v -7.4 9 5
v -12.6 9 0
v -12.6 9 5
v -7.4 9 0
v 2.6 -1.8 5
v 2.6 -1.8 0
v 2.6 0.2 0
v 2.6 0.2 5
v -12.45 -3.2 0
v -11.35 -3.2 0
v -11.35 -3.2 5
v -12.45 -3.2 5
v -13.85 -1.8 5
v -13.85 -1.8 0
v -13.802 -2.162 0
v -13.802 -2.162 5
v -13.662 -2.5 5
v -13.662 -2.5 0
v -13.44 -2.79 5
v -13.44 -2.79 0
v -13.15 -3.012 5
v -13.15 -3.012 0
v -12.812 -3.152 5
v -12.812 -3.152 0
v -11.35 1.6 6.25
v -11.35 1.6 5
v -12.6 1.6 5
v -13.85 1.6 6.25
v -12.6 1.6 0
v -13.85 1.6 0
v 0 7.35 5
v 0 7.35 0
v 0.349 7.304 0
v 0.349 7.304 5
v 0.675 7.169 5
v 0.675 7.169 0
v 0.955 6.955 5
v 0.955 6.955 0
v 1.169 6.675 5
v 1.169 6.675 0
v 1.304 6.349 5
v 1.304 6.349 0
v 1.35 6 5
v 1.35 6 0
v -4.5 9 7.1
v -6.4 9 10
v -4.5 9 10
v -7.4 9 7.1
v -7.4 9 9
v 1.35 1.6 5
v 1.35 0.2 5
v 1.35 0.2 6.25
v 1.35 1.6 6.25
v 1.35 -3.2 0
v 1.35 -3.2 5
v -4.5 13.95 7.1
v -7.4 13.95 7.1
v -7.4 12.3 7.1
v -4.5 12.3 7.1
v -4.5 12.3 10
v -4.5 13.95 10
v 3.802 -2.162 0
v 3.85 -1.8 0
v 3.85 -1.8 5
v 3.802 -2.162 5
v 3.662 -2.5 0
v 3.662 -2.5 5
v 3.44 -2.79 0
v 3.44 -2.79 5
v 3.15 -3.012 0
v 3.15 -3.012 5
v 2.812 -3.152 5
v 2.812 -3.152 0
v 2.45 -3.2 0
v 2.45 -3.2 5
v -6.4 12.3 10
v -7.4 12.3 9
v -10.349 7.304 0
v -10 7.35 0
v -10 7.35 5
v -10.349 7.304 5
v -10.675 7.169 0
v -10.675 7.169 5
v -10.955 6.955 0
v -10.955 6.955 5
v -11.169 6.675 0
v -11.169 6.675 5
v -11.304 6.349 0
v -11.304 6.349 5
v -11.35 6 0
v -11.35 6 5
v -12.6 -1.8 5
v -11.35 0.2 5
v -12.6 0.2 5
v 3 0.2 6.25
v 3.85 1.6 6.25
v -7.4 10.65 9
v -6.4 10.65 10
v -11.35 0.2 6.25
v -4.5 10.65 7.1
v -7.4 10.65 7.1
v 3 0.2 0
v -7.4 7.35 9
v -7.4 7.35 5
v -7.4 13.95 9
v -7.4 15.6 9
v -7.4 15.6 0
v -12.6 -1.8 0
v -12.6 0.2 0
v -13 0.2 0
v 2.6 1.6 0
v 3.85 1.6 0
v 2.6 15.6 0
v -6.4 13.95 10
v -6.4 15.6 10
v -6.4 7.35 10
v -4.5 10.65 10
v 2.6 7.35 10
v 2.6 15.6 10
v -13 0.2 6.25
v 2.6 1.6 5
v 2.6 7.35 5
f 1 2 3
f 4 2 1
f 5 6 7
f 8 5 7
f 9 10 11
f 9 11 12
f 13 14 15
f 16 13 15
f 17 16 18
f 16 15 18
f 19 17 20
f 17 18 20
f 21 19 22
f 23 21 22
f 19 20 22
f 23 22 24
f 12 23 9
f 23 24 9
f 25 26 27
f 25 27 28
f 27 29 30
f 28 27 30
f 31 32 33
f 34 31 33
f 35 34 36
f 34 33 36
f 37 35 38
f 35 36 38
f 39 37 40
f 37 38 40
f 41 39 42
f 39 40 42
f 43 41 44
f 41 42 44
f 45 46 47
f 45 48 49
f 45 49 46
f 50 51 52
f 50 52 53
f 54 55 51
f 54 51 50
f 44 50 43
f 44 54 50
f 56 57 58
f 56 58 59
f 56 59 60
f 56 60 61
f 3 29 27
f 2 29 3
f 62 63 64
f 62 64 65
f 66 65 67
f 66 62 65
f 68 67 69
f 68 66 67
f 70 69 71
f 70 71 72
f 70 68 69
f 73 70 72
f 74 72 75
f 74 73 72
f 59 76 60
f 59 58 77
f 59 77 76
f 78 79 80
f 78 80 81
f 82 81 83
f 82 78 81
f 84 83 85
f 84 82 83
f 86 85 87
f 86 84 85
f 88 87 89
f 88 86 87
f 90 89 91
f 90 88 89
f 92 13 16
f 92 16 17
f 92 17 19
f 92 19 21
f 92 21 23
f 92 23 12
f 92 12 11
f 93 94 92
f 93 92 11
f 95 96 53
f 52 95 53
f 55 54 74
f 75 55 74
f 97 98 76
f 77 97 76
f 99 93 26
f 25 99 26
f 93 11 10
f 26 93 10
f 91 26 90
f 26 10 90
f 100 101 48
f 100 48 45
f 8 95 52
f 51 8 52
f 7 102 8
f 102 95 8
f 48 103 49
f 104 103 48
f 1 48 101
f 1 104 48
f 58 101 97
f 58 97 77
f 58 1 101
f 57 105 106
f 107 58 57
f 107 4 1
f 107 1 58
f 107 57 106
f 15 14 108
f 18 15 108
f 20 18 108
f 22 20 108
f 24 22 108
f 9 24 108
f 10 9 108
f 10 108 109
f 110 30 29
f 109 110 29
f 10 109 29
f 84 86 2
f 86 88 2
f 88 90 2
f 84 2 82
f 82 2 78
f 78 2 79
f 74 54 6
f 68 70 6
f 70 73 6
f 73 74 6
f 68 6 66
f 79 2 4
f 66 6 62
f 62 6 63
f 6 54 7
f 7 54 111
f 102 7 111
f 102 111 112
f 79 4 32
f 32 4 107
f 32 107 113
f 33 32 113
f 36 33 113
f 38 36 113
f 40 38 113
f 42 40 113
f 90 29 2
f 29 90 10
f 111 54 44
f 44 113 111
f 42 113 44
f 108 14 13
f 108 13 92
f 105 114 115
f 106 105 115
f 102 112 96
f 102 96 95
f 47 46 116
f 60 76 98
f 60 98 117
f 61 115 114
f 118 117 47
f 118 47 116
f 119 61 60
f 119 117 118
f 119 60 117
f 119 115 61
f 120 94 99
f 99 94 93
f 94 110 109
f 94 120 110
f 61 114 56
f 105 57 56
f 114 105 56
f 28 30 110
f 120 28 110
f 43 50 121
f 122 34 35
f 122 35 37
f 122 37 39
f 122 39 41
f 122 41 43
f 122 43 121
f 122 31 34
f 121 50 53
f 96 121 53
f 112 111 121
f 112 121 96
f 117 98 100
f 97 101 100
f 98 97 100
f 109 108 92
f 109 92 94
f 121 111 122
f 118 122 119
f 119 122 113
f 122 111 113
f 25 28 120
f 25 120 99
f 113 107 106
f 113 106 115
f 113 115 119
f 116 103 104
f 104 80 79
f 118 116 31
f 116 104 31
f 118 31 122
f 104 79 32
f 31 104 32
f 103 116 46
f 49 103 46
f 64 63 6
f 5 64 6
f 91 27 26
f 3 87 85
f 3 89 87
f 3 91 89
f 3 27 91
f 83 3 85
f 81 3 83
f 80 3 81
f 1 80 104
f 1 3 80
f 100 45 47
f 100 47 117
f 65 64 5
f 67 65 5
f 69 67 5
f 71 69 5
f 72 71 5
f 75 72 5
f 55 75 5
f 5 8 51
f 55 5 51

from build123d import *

# Parameters (mm, degrees)
PAD017_DEPTH           = 5
PAD020_DEPTH           = 6.25
SKETCH038_W            = 10
SKETCH038_H            = 1.65
PAD021_DEPTH           = 5
SKETCH089_W            = 10
SKETCH089_H            = 1.65
PAD058_DEPTH           = 10
SKETCH086_W            = 10
SKETCH086_H            = 1.65
PAD059_DEPTH           = 7.1
SKETCH087_W            = 7.1
SKETCH087_H            = 1.65
PAD060_DEPTH           = 10
SKETCH088_W            = 10
SKETCH088_H            = 1.65
PAD061_DEPTH           = 10
LINEARPATTERN020_COUNT = 2
LINEARPATTERN020_PITCH = 3.3
CHAMFER010_SIZE        = 1


with BuildPart() as bc_c:
    # Sketch034 → Pad017 (new body)
    with BuildSketch(Plane.XY):
        with BuildLine():
            Line((-1.35, -1.8), (-1.35, 6))
            ThreePointArc((0, 7.35), (-0.954594, 6.954594), (-1.35, 6))
            Line((0, 9), (0, 7.35))
            Line((-2.6, 9), (0, 9))
            Line((-2.6, -1.8), (-2.6, 9))
            Line((-3.85, -1.8), (-2.6, -1.8))
            ThreePointArc((-3.85, -1.8), (-3.439949, -2.789949), (-2.45, -3.2))
            Line((-1.35, -3.2), (-2.45, -3.2))
            Line((-1.35, -1.8), (-1.35, -3.2))
        make_face()
    extrude(amount=PAD017_DEPTH)

    # Sketch037 → Pad020 (join)
    with BuildSketch(Plane.XY):
        Polygon((-1.35, 0.2), (-1.35, 1.6), (-2.6, 1.6), (-3.85, 1.6), (-3, 0.2), (-2.6, 0.2), align=None)
    extrude(amount=PAD020_DEPTH)


with BuildPart() as body031:
    # Mirror002: instance of _bc_c
    add(bc_c.part.mirror(Plane(origin=(5, 0, 0), x_dir=(0, 1, 0), z_dir=(-1, 0, 0))))

    # Fusion002: union _bc_c
    add(bc_c.part)


with BuildPart() as body031_1:
    # Clone003 placement: moved
    add(body031.part.moved(Location((-5, 0, 0))))

    # Sketch038 → Pad021 (new body)
    with BuildSketch(Plane.XY):
        with Locations((0, 8.175)):
            Rectangle(SKETCH038_W, SKETCH038_H)
    extrude(amount=PAD021_DEPTH)

    # Sketch089 → Pad058 (new body)
    with BuildSketch(Plane.XY):
        with Locations((2.6, 8.175)):
            Rectangle(SKETCH089_W, SKETCH089_H)
    extrude(amount=PAD058_DEPTH)

    # Sketch086 → Pad059 (join)
    with BuildSketch(Plane.XY):
        with Locations((2.6, 9.825)):
            Rectangle(SKETCH086_W, SKETCH086_H)
    pad059 = extrude(amount=PAD059_DEPTH)

    # Sketch087 → Pad060 (join)
    with BuildSketch(Plane.XY):
        with Locations((4.05, 9.825)):
            Rectangle(SKETCH087_W, SKETCH087_H)
    pad060 = extrude(amount=PAD060_DEPTH)

    # Sketch088 → Pad061 (join)
    with BuildSketch(Plane.XY):
        with Locations((2.6, 11.475)):
            Rectangle(SKETCH088_W, SKETCH088_H)
    pad061 = extrude(amount=PAD061_DEPTH)

    # LinearPattern020: Pad061, Pad060, Pad059 ×2
    with Locations(*[(0, i * LINEARPATTERN020_PITCH, 0) for i in range(1, LINEARPATTERN020_COUNT)]):
        add(pad061)
        add(pad060)
        add(pad059)

    # Chamfer010
    chamfer010_edges = [body031_1.edges().sort_by_distance(p)[0] for p in [
        (-2.4, 14.775, 10),
        (-2.4, 11.475, 10),
        (-2.4, 8.175, 10),
    ]]
    chamfer(chamfer010_edges, length=CHAMFER010_SIZE)


with BuildPart() as body031_2:
    # Body031 placement: moved
    add(body031_1.part.moved(Location((-5, 0, 0))))


solid = body031_2.part
